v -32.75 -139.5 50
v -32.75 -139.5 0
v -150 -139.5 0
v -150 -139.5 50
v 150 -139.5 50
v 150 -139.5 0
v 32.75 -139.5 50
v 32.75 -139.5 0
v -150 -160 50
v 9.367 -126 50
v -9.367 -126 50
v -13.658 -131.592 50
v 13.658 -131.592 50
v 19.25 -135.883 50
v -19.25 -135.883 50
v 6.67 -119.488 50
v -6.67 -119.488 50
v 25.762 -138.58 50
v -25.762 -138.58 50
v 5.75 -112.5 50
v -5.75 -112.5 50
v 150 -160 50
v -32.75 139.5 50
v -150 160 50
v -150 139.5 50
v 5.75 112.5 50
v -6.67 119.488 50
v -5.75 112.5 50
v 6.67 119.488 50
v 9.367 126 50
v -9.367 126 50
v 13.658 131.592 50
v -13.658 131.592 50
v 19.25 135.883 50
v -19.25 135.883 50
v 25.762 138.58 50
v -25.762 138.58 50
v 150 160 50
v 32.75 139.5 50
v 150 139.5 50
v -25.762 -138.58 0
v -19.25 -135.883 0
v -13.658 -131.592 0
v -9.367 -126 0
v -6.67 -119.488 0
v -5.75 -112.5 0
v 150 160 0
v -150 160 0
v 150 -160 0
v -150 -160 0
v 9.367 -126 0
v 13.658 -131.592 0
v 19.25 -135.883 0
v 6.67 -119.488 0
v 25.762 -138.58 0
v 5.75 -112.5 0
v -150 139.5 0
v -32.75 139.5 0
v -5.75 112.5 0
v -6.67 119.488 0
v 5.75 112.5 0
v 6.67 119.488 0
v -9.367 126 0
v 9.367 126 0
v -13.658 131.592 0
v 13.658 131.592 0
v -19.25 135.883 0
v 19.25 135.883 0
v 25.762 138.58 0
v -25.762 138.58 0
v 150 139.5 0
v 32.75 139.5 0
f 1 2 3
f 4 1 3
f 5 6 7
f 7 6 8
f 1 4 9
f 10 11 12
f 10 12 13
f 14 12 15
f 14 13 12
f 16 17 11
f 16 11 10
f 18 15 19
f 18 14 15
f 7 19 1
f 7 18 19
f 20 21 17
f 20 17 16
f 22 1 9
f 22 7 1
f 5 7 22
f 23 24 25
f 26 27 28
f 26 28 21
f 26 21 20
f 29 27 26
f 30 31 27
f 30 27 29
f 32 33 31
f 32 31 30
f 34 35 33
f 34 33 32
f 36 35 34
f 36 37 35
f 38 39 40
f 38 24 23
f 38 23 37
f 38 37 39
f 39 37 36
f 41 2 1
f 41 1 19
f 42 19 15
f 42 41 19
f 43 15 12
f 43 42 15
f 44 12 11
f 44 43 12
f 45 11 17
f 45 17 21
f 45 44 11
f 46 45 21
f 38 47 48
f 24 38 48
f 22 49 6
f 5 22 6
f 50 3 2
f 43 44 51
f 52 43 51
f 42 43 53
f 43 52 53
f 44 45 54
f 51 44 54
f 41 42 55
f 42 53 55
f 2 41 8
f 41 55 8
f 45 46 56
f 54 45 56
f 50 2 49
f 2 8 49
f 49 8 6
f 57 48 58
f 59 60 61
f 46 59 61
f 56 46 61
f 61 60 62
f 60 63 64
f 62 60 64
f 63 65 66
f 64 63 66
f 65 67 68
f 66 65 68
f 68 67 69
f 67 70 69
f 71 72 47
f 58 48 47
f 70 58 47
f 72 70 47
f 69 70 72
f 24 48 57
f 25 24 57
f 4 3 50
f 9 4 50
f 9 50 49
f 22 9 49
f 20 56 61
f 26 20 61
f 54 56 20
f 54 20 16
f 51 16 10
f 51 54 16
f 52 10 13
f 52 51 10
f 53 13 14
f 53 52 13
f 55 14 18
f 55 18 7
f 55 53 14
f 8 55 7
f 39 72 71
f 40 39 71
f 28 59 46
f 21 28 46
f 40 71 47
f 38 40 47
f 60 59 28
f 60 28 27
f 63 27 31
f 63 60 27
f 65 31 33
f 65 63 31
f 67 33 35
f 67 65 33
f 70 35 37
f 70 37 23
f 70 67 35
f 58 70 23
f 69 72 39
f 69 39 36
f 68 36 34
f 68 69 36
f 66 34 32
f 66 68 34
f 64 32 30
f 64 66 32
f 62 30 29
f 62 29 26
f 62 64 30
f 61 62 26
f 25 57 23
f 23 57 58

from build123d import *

# Parameters (mm, degrees)
EXTRUDE_DEPTH = 50


with BuildPart() as part:
    # Sketch → Extrude (new body)
    with BuildSketch(Plane.XY):
        with BuildLine():
            Line((5.75, -112.5), (5.75, 112.5))
            ThreePointArc((32.75, 139.5), (13.658117, 131.591883), (5.75, 112.5))
            Line((32.75, 139.5), (150, 139.5))
            Line((150, 139.5), (150, 160))
            Line((150, 160), (-150, 160))
            Line((-150, 160), (-150, 139.5))
            Line((-150, 139.5), (-32.75, 139.5))
            ThreePointArc((-5.75, 112.5), (-13.658117, 131.591883), (-32.75, 139.5))
            Line((-5.75, 112.5), (-5.75, -112.5))
            ThreePointArc((-32.75, -139.5), (-13.658117, -131.591883), (-5.75, -112.5))
            Line((-32.75, -139.5), (-150, -139.5))
            Line((-150, -139.5), (-150, -160))
            Line((-150, -160), (150, -160))
            Line((150, -160), (150, -139.5))
            Line((150, -139.5), (32.75, -139.5))
            ThreePointArc((5.75, -112.5), (13.658117, -131.591883), (32.75, -139.5))
        make_face()
    extrude(amount=EXTRUDE_DEPTH)


solid = part.part
